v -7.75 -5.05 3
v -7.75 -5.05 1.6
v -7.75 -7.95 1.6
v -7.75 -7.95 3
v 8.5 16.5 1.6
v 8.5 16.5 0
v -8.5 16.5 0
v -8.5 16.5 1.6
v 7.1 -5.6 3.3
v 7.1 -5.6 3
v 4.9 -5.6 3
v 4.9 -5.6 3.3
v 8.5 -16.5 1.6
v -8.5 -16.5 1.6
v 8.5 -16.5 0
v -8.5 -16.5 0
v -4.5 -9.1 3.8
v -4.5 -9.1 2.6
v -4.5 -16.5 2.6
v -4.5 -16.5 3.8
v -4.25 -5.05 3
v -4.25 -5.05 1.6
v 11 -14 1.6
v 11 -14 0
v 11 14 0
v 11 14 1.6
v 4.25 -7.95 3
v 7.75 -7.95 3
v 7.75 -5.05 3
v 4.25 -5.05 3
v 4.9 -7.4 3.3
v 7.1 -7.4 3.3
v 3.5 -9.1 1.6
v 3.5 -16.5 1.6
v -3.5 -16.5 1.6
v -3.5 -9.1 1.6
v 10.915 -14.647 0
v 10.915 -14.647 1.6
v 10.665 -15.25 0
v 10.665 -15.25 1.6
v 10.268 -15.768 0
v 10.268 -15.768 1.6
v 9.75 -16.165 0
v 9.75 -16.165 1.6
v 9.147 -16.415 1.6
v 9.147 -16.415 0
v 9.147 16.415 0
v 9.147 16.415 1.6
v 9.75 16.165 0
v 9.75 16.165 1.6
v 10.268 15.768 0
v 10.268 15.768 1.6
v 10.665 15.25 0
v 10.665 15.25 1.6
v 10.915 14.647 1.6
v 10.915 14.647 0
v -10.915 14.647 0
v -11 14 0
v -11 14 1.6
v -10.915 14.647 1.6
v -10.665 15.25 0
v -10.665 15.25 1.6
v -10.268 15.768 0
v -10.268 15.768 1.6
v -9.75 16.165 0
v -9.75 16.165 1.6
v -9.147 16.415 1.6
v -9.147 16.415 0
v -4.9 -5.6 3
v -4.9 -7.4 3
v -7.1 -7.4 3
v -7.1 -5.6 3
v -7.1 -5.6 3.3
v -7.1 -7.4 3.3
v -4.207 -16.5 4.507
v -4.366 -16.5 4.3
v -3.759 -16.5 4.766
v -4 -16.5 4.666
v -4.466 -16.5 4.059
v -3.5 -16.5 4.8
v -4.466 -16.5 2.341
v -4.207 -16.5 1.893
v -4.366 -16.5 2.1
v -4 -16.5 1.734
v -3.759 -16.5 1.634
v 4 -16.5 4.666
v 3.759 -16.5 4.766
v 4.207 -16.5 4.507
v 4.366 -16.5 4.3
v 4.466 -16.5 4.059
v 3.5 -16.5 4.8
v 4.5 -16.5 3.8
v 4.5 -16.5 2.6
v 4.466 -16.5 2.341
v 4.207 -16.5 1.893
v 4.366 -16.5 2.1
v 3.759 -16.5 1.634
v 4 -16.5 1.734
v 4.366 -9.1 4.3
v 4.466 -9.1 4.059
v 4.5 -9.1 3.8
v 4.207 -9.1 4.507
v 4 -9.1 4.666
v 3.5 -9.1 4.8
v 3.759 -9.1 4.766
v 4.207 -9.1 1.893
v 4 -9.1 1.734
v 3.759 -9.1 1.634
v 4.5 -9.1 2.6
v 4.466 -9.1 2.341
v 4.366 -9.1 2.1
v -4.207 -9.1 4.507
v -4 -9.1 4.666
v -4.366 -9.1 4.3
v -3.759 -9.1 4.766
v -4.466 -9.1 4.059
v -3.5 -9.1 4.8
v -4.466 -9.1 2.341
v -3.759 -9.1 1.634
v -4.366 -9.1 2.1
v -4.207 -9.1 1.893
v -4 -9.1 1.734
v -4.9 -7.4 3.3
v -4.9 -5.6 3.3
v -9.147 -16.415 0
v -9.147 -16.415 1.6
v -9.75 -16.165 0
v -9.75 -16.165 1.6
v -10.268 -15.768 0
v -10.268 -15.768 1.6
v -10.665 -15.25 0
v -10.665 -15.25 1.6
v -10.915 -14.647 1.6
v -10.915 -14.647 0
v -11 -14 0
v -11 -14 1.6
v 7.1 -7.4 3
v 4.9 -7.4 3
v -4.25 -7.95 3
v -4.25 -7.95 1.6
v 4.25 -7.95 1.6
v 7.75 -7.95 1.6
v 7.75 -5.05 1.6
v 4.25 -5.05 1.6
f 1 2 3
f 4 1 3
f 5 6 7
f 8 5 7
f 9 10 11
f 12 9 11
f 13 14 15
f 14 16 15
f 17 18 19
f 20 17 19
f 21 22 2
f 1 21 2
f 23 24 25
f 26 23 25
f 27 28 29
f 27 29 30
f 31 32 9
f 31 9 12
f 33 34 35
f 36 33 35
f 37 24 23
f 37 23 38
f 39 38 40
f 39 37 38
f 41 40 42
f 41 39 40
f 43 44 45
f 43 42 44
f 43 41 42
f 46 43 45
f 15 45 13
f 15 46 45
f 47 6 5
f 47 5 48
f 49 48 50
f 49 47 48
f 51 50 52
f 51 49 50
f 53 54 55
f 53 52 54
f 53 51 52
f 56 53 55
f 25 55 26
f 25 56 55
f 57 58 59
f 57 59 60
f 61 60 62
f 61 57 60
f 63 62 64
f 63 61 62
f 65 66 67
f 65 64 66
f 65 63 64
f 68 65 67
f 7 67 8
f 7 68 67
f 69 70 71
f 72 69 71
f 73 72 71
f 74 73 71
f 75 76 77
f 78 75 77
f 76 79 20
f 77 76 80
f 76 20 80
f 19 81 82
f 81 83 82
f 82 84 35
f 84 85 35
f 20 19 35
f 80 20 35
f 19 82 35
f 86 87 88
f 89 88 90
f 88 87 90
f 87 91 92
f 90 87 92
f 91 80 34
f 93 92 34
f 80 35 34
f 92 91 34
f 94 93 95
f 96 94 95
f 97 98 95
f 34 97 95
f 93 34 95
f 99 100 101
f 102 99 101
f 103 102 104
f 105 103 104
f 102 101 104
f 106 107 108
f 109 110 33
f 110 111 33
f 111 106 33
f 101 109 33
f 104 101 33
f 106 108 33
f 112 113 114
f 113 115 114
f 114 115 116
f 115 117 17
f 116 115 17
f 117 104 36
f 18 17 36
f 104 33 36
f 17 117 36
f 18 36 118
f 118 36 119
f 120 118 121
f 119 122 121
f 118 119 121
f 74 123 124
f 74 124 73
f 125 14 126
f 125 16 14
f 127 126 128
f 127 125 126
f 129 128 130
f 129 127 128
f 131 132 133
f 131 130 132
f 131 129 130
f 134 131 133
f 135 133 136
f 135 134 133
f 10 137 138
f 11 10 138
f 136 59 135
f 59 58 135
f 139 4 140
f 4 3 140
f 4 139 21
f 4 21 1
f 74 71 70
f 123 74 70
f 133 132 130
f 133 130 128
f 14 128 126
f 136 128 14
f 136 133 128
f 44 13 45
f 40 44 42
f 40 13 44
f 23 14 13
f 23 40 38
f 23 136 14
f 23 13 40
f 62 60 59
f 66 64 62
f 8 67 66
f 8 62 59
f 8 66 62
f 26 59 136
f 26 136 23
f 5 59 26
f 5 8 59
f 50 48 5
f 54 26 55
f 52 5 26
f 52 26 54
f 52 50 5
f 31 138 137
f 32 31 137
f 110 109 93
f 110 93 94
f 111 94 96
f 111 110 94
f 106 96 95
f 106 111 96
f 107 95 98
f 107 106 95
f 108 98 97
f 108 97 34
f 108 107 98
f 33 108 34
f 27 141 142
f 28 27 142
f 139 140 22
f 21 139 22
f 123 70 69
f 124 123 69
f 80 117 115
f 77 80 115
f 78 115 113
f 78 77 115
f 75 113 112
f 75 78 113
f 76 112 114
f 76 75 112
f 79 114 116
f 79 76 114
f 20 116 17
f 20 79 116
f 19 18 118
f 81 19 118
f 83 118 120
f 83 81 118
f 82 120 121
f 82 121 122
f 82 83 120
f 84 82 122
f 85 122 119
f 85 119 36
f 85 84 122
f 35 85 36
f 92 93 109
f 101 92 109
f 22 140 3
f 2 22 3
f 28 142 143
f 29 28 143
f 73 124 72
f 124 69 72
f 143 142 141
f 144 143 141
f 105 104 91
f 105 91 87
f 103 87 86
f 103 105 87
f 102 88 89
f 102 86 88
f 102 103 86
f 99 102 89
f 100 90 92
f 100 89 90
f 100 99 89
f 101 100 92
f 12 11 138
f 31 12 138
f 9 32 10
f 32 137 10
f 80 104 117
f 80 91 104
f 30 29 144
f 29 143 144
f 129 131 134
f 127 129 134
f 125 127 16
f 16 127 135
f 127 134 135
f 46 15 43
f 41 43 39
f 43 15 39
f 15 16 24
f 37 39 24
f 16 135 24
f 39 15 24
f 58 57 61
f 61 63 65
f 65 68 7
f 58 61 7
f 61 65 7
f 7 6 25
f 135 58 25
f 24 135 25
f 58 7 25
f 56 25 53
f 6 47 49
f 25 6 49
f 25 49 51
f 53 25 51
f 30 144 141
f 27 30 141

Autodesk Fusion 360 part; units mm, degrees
sketch "Sketch1" plane through (0, 0, 0) normal (0, 0, 1) x (1, 0, 0) in component "USB_PCB"
  line L0 (8.5, 16.5) -> (-8.5, 16.5)
  line L1 (-11, 14) -> (-11, -14)
  line L2 (-8.5, -16.5) -> (8.5, -16.5)
  line L3 (11, -14) -> (11, 14)
  line L4 (11, 16.5) -> (-11, -16.5) construction
  line L5 (-11, 16.5) -> (11, -16.5) construction
  arc A0 (-8.5, 16.5) -> (-11, 14) centre (-8.5, 14) ccw
  arc A1 (11, 14) -> (8.5, 16.5) centre (8.5, 14) ccw
  arc A2 (8.5, -16.5) -> (11, -14) centre (8.5, -14) ccw
  arc A3 (-11, -14) -> (-8.5, -16.5) centre (-8.5, -14) ccw
  point P0 (0, -16.5)
  point P1 (-11, -16.5)
  point P2 (11, -16.5)
  dimension "d4" = 22
  dimension "d5" = 33
  dimension "d7" = 2.5
extrude "Extrude1" add sketch "Sketch1" along normal blind 1.6 makes body 1 in component "USB_PCB"
sketch "Sketch2" plane through (0, 0, 1.6) normal (0, 0, 1) x (-1, 0, 0) in component "USB_PCB"
  arc A0 (11, 14) -> (8.5, 16.5) centre (8.5, 14) ccw
  line L0 (8.5, 16.5) -> (-8.5, 16.5)
  arc A1 (-8.5, 16.5) -> (-11, 14) centre (-8.5, 14) ccw
  line L1 (-11, 14) -> (-11, -14)
  arc A2 (-11, -14) -> (-8.5, -16.5) centre (-8.5, -14) ccw
  line L2 (-8.5, -16.5) -> (8.5, -16.5)
  arc A3 (8.5, -16.5) -> (11, -14) centre (8.5, -14) ccw
  line L3 (11, -14) -> (11, 14)
  line L4 (-6, -16.5) -> (-6, 16.5) construction
  line L5 (6, -16.5) -> (6, 16.5) construction
  line L6 (11, 6.5) -> (-11, 6.5) construction
  line L7 (4.25, 5.05) -> (7.75, 5.05)
  line L8 (7.75, 5.05) -> (7.75, 7.95)
  line L9 (7.75, 7.95) -> (4.25, 7.95)
  line L10 (4.25, 7.95) -> (4.25, 5.05)
  line L11 (4.25, 5.05) -> (7.75, 7.95) construction
  line L12 (7.75, 5.05) -> (4.25, 7.95) construction
  line L13 (-7.75, 5.05) -> (-4.25, 5.05)
  line L14 (-4.25, 5.05) -> (-4.25, 7.95)
  line L15 (-4.25, 7.95) -> (-7.75, 7.95)
  line L16 (-7.75, 7.95) -> (-7.75, 5.05)
  line L17 (-7.75, 5.05) -> (-4.25, 7.95) construction
  line L18 (-4.25, 5.05) -> (-7.75, 7.95) construction
  line L19 (0, -16.5) -> (0, 16.5) construction
  line L20 (-11, 9.1) -> (11, 9.1) construction
  line L21 (11, 12.8) -> (-11, 12.8) construction
  line L22 (-4.5, 9.1) -> (4.5, 9.1)
  line L23 (4.5, 9.1) -> (4.5, 16.5)
  line L24 (4.5, 16.5) -> (-4.5, 16.5)
  line L25 (-4.5, 16.5) -> (-4.5, 9.1)
  line L26 (-4.5, 9.1) -> (4.5, 16.5) construction
  line L27 (4.5, 9.1) -> (-4.5, 16.5) construction
  point P0 (6, 6.5)
  point P1 (-6, 6.5)
  point P2 (0, 12.8)
  dimension "d12" = 10
  dimension "d13" = 5
  dimension "d14" = 5
  dimension "d18" = 3.5
  dimension "d19" = 2.9
  dimension "d20" = 3.5
  dimension "d21" = 2.9
  dimension "d36" = 7.4
  dimension "d37" = 3.7
  dimension "d38" = 9
  dimension "d39" = 7.4
extrude "Extrude2" add sketch "Sketch2" along normal blind 1.4 separate body contours L7 L8 L9 L10 | L13 L14 L15 L16 makes body 2 at (-5.4167, -6.0167, 1.6) makes body 3 at (6.5833, -6.0167, 1.6) in component "USB_PCB"
sketch "Sketch3" plane through (0, 0, 3) normal (0, 0, 1) x (-1, 0, 0) in component "USB_PCB"
  line L0 (4.25, 7.95) -> (4.25, 5.05)
  line L1 (4.25, 5.05) -> (7.75, 5.05)
  line L2 (7.75, 5.05) -> (7.75, 7.95)
  line L3 (7.75, 7.95) -> (4.25, 7.95)
  line L4 (6, 5.05) -> (6, 7.95) construction
  line L5 (-7.75, 7.95) -> (-7.75, 5.05) construction
  line L6 (7.75, 6.5) -> (-7.75, 6.5) construction
  line L7 (-7.75, 5.05) -> (-4.25, 5.05) construction
  line L8 (-4.25, 7.95) -> (-7.75, 7.95) construction
  line L9 (-6, 5.05) -> (-6, 7.95) construction
  line L10 (4.9, 5.6) -> (7.1, 5.6)
  line L11 (7.1, 5.6) -> (7.1, 7.4)
  line L12 (7.1, 7.4) -> (4.9, 7.4)
  line L13 (4.9, 7.4) -> (4.9, 5.6)
  line L14 (4.9, 5.6) -> (7.1, 7.4) construction
  line L15 (7.1, 5.6) -> (4.9, 7.4) construction
  line L16 (-7.1, 5.6) -> (-4.9, 5.6)
  line L17 (-4.9, 5.6) -> (-4.9, 7.4)
  line L18 (-4.9, 7.4) -> (-7.1, 7.4)
  line L19 (-7.1, 7.4) -> (-7.1, 5.6)
  line L20 (-7.1, 5.6) -> (-4.9, 7.4) construction
  line L21 (-4.9, 5.6) -> (-7.1, 7.4) construction
  point P0 (6, 6.5)
  point P1 (-6, 6.5)
  dimension "d27" = 2.2
  dimension "d28" = 1.8
  dimension "d29" = 2.2
  dimension "d30" = 1.8
extrude "Extrude3" add sketch "Sketch3" along normal blind 0.3 separate body contours L10 L11 L12 L13 | L16 L17 L18 L19 makes body 4 at (-6.3667, -6.2, 3) makes body 5 at (5.6333, -6.2, 3) in component "USB_PCB"
extrude "Extrude4" add sketch "Sketch2" along normal blind 3.2 separate body contours L0 L22 L23 L24 L25 makes body 6 in component "USB_PCB"
fillet "Fillet1" radius 1 4 edges at (-4.5, -12.8, 1.6) (-4.5, -12.8, 4.8) (4.5, -12.8, 4.8) (4.5, -12.8, 1.6) on bodies 6 in component "USB_PCB"
component "USB_PCB" placed x (1, 0, 0) y (0, 1, 0) z (0, 0, 1) at (0, 0, 0)
equation "Board_Width = 22 mm"
equation "Board_Height = 33 mm"
equation "PCB_Thickness = 1.6 mm"
equation "d4 = Board_Width"
equation "d5 = Board_Height"
equation "Board_Fillet_Radius = 2.5 mm"
equation "d7 = Board_Fillet_Radius"
equation "d8 = PCB_Thickness"
equation "Button_Up_Offset = 10 mm"
equation "Button_In_Offset = 5 mm"
equation "d12 = Button_Up_Offset"
equation "d13 = Button_In_Offset"
equation "d14 = Button_In_Offset"
equation "Button_Width = 3.5 mm"
equation "Button_Height = 2.9 mm"
equation "Button_Depth = 1.4 mm"
equation "d18 = Button_Width"
equation "d19 = Button_Height"
equation "d20 = Button_Width"
equation "d21 = Button_Height"
equation "d22 = Button_Depth"
equation "Button_Nipple_Width = 2.2 mm"
equation "Button_Nipple_Height = 1.8 mm"
equation "Button_Nipple_Depth = 0.3 mm"
equation "d27 = Button_Nipple_Width"
equation "d28 = Button_Nipple_Height"
equation "d29 = Button_Nipple_Width"
equation "d30 = Button_Nipple_Height"
equation "d31 = Button_Nipple_Depth"
equation "USB_Width = 9 mm"
equation "USB_Height = 7.4 mm"
equation "USB_Depth = 3.2 mm"
equation "d36 = USB_Height"
equation "d37 = USB_Height / 2"
equation "d38 = USB_Width"
equation "d39 = USB_Height"
equation "d40 = USB_Depth"
equation "USB_Radius = 1 mm"
equation "d44 = USB_Radius"
